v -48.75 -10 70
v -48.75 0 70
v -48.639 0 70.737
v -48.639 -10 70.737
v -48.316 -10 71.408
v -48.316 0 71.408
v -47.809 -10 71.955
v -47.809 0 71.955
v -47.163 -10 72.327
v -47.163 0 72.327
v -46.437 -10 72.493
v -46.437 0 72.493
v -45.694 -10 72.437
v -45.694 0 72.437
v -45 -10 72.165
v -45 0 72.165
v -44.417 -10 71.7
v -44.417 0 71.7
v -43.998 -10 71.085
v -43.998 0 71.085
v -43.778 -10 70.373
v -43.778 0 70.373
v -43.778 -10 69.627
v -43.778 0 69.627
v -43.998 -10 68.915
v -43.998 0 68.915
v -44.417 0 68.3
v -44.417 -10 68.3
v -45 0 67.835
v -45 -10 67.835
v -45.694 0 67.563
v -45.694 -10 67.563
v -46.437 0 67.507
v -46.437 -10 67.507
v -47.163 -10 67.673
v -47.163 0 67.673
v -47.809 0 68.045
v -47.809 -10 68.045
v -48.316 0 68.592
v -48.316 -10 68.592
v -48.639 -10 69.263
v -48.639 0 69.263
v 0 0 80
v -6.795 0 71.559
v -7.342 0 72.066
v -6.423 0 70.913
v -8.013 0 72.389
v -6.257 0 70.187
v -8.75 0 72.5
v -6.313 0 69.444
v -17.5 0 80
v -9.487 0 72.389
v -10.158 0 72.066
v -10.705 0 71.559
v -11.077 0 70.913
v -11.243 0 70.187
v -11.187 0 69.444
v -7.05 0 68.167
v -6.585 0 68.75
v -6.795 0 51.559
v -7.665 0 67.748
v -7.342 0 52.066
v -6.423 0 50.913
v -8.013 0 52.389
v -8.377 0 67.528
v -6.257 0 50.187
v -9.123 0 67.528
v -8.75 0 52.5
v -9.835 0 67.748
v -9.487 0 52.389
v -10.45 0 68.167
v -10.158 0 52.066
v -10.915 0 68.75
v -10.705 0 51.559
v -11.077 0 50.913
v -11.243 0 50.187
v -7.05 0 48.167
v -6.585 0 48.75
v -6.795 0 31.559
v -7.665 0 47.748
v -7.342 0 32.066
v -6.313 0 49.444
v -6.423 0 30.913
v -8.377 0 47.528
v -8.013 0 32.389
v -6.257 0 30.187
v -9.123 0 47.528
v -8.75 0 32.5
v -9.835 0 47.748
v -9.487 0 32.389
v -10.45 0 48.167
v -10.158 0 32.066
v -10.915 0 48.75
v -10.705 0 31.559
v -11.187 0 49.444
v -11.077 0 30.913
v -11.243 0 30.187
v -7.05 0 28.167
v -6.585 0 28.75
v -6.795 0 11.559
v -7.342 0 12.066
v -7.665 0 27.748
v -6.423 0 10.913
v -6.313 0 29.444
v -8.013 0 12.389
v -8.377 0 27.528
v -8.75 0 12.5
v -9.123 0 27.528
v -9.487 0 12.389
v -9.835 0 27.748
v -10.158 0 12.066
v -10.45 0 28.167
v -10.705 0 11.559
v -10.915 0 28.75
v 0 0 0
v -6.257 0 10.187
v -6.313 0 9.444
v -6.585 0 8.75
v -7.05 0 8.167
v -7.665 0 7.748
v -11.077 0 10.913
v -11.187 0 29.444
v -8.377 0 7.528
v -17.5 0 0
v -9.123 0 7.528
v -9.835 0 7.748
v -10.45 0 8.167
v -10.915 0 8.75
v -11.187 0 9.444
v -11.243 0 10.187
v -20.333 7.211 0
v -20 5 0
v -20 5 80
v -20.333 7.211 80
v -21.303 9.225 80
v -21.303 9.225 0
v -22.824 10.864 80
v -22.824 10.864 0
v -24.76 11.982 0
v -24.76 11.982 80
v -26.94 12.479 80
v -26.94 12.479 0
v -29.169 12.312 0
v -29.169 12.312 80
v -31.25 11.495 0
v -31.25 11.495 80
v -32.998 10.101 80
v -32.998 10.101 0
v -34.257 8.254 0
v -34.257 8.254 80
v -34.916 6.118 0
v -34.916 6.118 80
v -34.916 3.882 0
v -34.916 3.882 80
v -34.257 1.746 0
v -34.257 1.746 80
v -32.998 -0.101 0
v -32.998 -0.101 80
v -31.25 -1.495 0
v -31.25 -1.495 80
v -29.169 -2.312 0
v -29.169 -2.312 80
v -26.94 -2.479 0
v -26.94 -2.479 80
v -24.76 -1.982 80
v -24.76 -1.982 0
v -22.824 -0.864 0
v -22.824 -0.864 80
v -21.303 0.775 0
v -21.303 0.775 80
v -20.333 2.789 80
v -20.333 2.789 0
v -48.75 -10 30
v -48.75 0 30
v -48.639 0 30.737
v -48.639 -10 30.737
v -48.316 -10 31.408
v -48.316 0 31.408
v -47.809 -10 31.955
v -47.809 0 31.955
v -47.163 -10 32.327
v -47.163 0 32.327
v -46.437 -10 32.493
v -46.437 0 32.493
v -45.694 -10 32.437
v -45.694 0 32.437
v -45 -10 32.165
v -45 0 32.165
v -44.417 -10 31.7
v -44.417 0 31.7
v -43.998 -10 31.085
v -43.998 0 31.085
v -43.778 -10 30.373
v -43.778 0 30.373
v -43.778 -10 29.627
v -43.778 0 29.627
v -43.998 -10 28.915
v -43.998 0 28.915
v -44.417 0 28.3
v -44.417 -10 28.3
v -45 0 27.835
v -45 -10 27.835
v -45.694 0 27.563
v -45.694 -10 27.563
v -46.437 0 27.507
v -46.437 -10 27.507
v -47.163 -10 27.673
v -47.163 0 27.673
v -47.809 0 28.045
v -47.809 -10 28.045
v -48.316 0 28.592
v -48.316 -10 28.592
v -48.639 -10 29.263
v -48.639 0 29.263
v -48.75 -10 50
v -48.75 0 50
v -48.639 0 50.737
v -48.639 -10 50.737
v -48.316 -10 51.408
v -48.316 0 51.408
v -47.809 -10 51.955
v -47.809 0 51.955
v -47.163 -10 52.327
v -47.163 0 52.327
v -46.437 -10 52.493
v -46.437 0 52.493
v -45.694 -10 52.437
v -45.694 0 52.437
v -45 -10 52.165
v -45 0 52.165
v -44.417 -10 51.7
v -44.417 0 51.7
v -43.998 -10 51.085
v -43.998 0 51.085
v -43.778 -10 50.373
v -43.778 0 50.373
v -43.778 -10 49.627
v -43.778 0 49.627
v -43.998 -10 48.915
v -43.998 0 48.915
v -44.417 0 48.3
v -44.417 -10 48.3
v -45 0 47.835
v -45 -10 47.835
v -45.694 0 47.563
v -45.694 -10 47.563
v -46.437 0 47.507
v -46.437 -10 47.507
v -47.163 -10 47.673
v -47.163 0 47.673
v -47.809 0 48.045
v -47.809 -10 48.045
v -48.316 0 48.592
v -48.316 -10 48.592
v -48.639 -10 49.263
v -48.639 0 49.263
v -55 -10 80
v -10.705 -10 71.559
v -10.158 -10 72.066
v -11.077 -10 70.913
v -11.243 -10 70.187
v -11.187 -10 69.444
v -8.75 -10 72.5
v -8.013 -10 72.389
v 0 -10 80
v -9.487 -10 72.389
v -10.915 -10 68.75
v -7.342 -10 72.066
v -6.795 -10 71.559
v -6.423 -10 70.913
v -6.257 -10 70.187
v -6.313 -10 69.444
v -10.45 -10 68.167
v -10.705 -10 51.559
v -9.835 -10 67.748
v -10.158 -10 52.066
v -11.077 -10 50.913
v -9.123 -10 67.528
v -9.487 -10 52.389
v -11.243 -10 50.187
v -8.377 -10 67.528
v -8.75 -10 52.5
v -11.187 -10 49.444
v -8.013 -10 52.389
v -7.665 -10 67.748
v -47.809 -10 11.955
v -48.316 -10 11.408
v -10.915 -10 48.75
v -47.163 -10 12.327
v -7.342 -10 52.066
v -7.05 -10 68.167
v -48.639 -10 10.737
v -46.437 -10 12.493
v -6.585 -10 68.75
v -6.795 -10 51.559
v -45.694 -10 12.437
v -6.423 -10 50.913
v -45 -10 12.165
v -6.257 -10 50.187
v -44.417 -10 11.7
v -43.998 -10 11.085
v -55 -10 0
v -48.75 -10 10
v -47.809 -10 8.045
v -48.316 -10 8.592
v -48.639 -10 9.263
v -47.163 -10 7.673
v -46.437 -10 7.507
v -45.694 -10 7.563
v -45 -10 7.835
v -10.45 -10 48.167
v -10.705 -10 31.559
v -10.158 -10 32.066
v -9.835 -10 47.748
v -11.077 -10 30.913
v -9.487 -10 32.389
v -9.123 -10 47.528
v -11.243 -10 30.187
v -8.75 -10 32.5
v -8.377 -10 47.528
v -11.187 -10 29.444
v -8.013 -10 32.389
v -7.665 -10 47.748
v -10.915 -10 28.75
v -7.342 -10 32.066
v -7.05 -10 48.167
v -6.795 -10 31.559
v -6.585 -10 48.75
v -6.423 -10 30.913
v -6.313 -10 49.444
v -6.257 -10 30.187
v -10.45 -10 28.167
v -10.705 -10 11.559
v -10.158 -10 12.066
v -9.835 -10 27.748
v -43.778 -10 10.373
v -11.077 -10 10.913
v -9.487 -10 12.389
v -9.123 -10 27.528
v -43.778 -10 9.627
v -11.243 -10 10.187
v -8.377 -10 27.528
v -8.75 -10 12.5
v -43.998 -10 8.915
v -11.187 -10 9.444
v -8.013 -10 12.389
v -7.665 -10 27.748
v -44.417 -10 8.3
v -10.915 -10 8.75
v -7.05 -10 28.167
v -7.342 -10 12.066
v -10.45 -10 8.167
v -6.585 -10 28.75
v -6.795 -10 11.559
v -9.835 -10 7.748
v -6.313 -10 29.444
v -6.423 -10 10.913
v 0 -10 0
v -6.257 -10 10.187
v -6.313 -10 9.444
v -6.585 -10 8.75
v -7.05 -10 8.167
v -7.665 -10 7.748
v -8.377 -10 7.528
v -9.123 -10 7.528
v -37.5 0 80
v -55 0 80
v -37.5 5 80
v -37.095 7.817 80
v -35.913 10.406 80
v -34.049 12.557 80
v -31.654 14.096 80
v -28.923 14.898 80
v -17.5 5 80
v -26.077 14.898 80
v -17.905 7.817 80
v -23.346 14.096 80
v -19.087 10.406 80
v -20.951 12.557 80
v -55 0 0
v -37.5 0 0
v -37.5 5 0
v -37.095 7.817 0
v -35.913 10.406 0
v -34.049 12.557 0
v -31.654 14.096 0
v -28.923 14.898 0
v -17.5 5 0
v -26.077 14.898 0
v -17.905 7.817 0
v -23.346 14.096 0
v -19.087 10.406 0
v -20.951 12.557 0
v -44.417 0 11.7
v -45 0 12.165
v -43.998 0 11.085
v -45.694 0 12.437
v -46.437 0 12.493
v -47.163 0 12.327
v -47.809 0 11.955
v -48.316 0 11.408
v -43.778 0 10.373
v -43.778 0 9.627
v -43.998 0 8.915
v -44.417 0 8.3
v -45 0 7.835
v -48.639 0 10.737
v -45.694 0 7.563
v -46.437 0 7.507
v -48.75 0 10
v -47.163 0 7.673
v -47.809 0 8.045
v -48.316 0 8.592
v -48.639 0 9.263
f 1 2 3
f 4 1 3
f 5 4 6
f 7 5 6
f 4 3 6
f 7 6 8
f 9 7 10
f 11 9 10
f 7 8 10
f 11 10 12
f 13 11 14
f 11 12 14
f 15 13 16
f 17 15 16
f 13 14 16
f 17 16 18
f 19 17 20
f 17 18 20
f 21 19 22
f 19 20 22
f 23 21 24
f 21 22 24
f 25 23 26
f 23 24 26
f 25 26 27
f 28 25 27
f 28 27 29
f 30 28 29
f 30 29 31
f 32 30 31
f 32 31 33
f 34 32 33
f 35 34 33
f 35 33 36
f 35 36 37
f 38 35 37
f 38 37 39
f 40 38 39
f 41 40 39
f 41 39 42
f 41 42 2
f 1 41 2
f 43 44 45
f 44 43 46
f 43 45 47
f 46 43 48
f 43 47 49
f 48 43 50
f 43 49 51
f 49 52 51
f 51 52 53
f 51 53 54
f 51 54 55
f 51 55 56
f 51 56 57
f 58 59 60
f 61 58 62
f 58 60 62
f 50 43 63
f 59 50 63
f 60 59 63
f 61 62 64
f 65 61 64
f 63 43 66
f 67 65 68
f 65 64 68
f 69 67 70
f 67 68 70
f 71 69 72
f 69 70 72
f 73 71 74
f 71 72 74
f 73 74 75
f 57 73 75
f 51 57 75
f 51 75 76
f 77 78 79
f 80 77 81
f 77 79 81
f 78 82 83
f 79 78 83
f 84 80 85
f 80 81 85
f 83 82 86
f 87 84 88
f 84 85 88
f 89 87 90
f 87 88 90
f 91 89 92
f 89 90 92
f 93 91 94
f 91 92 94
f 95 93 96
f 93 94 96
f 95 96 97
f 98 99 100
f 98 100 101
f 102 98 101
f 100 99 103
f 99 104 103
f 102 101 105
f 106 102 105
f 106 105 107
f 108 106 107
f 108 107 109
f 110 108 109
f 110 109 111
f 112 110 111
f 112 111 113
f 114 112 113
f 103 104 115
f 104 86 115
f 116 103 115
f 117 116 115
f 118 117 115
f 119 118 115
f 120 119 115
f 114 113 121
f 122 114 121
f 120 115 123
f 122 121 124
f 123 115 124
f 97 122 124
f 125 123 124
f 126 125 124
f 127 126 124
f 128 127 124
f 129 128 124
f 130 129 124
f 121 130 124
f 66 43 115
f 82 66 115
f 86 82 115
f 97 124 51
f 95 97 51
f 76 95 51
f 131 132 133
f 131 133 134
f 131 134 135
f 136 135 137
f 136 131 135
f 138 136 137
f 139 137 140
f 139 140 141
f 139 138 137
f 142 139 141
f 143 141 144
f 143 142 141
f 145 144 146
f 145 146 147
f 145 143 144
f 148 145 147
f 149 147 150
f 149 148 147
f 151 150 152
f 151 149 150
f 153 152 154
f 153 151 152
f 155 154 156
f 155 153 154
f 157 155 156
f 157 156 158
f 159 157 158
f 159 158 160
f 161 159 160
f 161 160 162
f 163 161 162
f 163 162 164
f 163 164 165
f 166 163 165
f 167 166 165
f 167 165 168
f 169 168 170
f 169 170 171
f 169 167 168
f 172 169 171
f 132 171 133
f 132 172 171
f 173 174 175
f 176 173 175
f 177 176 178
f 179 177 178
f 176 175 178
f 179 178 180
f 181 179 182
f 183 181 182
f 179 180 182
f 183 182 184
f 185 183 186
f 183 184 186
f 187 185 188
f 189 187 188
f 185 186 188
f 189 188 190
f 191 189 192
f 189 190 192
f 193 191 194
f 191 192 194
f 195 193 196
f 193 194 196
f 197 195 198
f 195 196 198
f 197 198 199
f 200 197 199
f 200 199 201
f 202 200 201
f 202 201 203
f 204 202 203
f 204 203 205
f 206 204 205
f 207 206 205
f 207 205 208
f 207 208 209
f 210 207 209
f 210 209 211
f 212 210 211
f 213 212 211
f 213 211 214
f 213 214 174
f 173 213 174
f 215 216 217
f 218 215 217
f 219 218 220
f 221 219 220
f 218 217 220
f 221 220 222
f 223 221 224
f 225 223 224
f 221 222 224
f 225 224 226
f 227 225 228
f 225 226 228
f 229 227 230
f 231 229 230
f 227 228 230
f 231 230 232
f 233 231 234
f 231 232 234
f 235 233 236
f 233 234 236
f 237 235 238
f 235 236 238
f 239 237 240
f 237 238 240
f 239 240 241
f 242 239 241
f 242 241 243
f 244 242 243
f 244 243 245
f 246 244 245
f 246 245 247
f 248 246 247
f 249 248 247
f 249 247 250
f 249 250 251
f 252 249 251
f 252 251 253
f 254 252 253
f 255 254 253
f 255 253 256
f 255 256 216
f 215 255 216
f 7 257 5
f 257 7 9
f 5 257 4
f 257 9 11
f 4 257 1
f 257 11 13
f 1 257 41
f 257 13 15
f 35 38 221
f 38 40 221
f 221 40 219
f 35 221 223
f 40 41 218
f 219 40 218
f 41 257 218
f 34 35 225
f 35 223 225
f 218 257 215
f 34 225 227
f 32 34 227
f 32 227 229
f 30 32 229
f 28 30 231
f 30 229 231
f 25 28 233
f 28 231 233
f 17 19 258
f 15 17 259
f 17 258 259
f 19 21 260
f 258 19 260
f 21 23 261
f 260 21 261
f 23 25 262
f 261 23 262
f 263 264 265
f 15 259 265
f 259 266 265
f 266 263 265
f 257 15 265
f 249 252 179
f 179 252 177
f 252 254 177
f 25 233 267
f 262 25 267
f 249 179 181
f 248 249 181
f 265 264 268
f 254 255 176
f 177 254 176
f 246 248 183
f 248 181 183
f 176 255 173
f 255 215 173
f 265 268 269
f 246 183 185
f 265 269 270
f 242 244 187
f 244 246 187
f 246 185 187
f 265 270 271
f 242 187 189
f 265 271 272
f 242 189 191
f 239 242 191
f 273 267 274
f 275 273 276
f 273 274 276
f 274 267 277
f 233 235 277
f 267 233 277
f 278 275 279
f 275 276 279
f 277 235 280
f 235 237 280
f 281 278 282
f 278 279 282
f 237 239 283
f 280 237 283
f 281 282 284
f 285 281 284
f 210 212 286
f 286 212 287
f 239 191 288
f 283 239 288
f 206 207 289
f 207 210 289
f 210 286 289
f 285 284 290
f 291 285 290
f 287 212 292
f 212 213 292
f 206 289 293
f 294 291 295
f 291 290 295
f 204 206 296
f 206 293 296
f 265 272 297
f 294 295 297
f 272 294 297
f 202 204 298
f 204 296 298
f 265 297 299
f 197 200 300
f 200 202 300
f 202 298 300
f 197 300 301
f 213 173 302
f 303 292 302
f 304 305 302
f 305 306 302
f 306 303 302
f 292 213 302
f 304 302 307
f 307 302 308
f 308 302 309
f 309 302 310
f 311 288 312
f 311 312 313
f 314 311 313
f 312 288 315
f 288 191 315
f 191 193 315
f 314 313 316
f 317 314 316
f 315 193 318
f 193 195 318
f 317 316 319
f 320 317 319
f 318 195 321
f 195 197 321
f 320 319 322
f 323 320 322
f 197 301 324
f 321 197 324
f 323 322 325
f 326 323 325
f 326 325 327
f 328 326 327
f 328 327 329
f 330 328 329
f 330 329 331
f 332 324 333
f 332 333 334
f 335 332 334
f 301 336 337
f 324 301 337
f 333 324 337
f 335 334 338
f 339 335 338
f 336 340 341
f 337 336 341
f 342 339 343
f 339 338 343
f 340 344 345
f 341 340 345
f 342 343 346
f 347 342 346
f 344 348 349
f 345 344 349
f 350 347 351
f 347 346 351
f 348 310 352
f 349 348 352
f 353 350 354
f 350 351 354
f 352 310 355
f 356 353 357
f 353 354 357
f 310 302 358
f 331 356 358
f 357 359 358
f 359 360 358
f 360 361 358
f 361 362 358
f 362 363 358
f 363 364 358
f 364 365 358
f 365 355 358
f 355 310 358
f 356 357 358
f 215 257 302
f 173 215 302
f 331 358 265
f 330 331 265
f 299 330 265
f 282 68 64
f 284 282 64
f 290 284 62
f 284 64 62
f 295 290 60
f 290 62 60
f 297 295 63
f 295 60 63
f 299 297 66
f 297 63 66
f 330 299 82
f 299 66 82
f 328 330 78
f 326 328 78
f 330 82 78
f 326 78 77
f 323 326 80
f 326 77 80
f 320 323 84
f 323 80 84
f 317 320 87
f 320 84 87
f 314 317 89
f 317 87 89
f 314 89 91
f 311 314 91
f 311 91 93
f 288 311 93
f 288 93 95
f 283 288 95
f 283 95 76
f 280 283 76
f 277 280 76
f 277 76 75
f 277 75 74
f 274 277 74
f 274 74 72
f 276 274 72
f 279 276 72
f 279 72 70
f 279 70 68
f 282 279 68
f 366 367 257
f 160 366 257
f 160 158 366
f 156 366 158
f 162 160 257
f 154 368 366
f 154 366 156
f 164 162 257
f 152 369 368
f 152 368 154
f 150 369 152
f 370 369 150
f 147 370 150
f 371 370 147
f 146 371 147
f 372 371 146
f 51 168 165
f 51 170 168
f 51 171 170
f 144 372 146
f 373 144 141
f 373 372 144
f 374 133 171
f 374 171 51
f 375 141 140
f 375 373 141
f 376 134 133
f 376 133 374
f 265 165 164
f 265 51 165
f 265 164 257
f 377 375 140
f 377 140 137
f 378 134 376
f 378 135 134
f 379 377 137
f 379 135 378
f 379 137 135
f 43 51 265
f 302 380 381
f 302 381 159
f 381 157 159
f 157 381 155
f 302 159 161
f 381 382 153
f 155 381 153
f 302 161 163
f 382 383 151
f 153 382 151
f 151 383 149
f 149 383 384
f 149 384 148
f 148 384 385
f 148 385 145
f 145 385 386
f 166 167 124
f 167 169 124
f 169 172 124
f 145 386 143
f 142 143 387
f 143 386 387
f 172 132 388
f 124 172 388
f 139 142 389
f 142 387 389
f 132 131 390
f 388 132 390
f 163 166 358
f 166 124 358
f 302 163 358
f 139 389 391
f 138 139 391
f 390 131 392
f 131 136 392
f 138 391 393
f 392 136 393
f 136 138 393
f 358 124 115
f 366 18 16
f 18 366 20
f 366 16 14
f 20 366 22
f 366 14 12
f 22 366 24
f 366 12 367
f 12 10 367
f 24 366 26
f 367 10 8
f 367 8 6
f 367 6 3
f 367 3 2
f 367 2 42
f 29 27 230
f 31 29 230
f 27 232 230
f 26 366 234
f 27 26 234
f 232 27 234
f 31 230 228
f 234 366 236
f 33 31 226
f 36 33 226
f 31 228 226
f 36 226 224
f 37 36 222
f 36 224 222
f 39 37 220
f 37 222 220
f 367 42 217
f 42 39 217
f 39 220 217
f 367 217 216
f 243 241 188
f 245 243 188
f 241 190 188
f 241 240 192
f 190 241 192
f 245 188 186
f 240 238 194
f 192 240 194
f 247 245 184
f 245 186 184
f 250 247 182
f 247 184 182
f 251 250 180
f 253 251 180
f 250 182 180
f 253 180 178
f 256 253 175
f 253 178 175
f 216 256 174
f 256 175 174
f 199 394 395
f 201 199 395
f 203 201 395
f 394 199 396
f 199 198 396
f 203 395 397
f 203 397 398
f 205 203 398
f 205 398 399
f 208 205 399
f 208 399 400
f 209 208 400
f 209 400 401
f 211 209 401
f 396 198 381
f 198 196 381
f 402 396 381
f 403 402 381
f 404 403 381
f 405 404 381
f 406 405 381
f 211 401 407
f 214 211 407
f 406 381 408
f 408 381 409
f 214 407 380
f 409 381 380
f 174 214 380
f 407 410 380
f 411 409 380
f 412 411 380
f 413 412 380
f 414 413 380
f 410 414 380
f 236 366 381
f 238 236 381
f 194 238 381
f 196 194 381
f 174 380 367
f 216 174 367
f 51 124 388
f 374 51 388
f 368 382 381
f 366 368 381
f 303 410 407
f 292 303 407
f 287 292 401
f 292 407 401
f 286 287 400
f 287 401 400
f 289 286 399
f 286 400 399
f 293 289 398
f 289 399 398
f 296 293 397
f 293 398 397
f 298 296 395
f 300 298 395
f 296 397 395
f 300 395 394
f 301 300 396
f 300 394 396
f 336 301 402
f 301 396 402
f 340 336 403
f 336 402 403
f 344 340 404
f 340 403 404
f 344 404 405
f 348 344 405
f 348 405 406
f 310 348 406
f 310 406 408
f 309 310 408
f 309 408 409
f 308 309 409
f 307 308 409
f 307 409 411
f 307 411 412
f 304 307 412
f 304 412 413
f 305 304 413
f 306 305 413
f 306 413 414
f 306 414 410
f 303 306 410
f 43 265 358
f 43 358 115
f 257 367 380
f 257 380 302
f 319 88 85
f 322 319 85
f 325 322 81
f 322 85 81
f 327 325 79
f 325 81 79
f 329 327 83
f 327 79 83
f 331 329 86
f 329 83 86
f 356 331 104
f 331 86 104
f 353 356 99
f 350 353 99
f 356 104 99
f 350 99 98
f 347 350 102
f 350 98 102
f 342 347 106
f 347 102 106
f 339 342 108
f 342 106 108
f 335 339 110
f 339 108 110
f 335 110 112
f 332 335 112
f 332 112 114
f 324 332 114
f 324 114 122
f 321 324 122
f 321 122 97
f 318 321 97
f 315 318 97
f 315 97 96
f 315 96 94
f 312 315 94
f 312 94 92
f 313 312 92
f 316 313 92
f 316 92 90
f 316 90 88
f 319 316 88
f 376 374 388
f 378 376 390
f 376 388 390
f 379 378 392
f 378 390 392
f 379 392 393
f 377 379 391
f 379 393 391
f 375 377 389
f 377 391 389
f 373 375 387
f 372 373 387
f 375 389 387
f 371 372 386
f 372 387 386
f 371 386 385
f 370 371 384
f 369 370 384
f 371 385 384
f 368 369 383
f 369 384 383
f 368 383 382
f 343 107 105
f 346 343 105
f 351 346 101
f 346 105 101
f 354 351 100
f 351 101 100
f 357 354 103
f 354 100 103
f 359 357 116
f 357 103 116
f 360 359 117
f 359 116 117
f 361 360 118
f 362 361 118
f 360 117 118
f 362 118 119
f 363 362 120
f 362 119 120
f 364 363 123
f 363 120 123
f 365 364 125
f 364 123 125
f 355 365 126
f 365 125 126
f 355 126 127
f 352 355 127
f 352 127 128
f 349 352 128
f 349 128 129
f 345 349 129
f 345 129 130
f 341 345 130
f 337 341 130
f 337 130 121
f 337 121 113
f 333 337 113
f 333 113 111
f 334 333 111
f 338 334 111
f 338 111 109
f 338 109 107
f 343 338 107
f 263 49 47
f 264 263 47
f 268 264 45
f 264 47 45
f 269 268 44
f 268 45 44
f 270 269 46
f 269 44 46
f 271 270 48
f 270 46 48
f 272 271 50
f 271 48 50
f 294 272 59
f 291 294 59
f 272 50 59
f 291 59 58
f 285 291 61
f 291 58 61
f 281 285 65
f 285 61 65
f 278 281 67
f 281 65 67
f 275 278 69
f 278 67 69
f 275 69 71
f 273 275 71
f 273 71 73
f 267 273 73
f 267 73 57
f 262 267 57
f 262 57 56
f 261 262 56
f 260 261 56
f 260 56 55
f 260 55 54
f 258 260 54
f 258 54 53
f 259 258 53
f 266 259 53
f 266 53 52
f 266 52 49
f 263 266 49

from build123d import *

# Parameters (mm, degrees)
SKETCH1_R           = 7.5
BOSS_EXTRUDE2_DEPTH = 80
SKETCH3_R           = 2.5
CUT_EXTRUDE1_DEPTH  = 2000


with BuildPart() as part:
    # Sketch1 → Boss-Extrude2 (new body)
    with BuildSketch(Plane.XY):
        with BuildLine():
            Line((0, 0), (-17.5, 0))
            Line((-17.5, 0), (-17.5, 5))
            ThreePointArc((-17.5, 5), (-27.5, 15), (-37.5, 5))
            Line((-37.5, 5), (-37.5, 0))
            Line((-37.5, 0), (-55, 0))
            Line((-55, 0), (-55, -10))
            Line((-55, -10), (0, -10))
            Line((0, -10), (0, 0))
        make_face()
        with Locations((-27.5, 5)):
            Circle(SKETCH1_R, mode=Mode.SUBTRACT)
    extrude(amount=BOSS_EXTRUDE2_DEPTH)

    # Sketch3 → Cut-Extrude1 (cut)
    with BuildSketch(Plane(origin=(0, 0, 0), x_dir=(1, 0, 0), z_dir=(0, 1, 0))):
        with Locations(Location((-8.75, -10, 0), (0, 0, 270))):
            Circle(SKETCH3_R)
        with Locations(Location((-8.75, -30, 0), (0, 0, 270))):
            Circle(SKETCH3_R)
        with Locations(Location((-8.75, -50, 0), (0, 0, 270))):
            Circle(SKETCH3_R)
        with Locations(Location((-8.75, -70, 0), (0, 0, 270))):
            Circle(SKETCH3_R)
        with Locations(Location((-46.25, -70, 0), (0, 0, 180))):
            Circle(SKETCH3_R)
        with Locations(Location((-46.25, -50, 0), (0, 0, 180))):
            Circle(SKETCH3_R)
        with Locations(Location((-46.25, -30, 0), (0, 0, 180))):
            Circle(SKETCH3_R)
        with Locations(Location((-46.25, -10, 0), (0, 0, 180))):
            Circle(SKETCH3_R)
    extrude(amount=-CUT_EXTRUDE1_DEPTH, mode=Mode.SUBTRACT)


solid = part.part
